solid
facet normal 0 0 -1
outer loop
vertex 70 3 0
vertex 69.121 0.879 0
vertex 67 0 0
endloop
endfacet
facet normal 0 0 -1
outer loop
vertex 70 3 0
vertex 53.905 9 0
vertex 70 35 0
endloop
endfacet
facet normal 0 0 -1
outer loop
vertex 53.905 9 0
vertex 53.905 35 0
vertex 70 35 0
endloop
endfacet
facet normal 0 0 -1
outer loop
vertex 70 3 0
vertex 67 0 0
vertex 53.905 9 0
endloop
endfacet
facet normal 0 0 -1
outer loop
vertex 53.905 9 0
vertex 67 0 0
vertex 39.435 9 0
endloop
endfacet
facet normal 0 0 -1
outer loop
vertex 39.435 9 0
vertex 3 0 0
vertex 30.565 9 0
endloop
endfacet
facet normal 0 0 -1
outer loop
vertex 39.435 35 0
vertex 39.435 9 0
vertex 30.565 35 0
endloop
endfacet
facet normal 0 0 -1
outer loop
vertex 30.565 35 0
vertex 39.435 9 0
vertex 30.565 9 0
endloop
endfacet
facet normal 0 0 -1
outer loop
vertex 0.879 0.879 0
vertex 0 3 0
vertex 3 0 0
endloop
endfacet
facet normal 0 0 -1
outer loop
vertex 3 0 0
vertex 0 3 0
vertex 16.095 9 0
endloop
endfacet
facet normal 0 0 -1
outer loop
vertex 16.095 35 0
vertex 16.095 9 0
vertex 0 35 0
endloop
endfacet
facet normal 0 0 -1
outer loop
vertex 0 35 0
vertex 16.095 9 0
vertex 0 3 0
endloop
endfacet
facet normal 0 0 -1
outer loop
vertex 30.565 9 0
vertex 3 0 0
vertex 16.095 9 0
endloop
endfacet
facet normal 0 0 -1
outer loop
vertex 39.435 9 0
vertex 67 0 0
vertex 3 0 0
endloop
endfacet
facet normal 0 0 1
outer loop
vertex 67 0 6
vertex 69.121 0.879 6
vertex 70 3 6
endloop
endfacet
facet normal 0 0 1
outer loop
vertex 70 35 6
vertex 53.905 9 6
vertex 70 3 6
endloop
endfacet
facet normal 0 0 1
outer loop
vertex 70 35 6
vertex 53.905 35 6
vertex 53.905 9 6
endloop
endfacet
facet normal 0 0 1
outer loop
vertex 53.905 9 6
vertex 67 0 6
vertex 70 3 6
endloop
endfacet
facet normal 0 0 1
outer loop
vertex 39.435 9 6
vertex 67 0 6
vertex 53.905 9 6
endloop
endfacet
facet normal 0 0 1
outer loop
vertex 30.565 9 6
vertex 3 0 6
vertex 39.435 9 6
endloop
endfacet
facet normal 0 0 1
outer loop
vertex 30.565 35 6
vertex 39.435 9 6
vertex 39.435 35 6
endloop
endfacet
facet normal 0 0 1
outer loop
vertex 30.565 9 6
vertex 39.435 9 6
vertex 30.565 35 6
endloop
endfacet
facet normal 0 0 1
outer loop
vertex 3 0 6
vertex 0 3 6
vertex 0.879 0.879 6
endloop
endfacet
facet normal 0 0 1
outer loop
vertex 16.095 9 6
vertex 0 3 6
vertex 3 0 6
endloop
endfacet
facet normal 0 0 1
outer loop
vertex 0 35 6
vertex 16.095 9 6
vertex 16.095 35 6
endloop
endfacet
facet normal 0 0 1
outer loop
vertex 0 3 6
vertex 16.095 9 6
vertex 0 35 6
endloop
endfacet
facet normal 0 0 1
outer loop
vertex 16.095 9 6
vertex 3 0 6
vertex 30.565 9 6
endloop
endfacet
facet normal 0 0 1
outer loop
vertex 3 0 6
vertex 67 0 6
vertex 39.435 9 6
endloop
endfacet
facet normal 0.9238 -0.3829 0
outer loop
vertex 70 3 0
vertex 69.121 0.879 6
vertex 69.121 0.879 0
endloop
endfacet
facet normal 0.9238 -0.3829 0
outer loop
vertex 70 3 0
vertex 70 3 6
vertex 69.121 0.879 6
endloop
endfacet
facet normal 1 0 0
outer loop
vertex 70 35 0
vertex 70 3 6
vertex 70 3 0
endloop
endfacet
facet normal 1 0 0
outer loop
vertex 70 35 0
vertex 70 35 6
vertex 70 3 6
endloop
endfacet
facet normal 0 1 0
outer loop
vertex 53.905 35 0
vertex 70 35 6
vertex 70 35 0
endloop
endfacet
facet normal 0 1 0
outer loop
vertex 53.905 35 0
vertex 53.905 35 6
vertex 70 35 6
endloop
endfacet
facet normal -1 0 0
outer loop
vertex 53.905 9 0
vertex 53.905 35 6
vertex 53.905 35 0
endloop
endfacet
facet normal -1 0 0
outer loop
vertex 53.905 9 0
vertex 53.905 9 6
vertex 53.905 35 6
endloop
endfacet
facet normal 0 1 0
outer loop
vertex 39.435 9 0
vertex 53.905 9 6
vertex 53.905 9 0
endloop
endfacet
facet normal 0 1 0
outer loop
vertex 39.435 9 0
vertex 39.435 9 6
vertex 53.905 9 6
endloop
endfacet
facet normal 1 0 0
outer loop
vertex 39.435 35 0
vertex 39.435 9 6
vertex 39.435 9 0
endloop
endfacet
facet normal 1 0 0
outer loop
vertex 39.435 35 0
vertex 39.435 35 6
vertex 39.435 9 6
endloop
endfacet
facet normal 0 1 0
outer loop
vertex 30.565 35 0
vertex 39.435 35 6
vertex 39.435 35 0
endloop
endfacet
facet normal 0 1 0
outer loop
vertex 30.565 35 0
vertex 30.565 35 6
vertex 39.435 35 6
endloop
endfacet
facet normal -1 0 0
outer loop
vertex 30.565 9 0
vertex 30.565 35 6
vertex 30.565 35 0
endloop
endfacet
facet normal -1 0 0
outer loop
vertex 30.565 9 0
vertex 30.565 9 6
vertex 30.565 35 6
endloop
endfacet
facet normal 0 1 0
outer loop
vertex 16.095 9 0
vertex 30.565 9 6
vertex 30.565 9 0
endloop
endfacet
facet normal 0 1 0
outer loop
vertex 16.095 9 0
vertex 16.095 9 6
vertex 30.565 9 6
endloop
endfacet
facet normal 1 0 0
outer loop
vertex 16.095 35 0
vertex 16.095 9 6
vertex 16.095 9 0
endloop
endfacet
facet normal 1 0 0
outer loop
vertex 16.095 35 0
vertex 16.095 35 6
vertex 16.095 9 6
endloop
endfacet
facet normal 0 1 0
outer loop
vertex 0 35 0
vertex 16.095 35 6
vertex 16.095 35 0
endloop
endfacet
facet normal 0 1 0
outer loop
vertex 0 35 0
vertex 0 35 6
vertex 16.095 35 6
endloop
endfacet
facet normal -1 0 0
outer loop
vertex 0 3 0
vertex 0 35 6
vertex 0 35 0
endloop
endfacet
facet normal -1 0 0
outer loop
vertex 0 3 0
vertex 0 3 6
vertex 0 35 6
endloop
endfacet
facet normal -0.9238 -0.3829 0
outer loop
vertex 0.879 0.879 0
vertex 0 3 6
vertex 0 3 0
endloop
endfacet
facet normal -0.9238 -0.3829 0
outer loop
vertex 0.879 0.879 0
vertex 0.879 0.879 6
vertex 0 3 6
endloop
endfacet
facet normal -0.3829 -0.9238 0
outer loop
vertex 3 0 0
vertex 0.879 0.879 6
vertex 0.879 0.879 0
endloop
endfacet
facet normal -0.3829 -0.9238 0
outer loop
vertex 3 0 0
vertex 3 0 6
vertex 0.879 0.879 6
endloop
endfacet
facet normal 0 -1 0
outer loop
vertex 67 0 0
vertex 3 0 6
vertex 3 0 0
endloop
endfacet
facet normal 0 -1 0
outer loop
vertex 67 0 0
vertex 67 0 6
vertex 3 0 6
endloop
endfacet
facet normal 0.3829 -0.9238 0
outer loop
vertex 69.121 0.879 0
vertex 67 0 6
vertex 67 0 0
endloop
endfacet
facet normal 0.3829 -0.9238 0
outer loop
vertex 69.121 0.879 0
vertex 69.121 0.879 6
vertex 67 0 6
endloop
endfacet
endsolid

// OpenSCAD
$fn = 32;

// ----------------------------------------------------------------------
// Window plate: 70 x 35 mm, 2 open windows
// ----------------------------------------------------------------------

// --- parameters (mm) ---
profile_height = 6;       // extrusion height
profile_points = 16;      // points of the closed outline

profile = [[0, 3], [0.879, 0.879], [3, 0], [67, 0], [69.121, 0.879], [70, 3], [70, 35], [53.905, 35], [53.905, 9], [39.435, 9], [39.435, 35], [30.565, 35], [30.565, 9], [16.095, 9], [16.095, 35], [0, 35]];  // single closed polygon, 16 points, counter clockwise

// --- the one profile operation ---
linear_extrude(height = profile_height) polygon(points = profile);
